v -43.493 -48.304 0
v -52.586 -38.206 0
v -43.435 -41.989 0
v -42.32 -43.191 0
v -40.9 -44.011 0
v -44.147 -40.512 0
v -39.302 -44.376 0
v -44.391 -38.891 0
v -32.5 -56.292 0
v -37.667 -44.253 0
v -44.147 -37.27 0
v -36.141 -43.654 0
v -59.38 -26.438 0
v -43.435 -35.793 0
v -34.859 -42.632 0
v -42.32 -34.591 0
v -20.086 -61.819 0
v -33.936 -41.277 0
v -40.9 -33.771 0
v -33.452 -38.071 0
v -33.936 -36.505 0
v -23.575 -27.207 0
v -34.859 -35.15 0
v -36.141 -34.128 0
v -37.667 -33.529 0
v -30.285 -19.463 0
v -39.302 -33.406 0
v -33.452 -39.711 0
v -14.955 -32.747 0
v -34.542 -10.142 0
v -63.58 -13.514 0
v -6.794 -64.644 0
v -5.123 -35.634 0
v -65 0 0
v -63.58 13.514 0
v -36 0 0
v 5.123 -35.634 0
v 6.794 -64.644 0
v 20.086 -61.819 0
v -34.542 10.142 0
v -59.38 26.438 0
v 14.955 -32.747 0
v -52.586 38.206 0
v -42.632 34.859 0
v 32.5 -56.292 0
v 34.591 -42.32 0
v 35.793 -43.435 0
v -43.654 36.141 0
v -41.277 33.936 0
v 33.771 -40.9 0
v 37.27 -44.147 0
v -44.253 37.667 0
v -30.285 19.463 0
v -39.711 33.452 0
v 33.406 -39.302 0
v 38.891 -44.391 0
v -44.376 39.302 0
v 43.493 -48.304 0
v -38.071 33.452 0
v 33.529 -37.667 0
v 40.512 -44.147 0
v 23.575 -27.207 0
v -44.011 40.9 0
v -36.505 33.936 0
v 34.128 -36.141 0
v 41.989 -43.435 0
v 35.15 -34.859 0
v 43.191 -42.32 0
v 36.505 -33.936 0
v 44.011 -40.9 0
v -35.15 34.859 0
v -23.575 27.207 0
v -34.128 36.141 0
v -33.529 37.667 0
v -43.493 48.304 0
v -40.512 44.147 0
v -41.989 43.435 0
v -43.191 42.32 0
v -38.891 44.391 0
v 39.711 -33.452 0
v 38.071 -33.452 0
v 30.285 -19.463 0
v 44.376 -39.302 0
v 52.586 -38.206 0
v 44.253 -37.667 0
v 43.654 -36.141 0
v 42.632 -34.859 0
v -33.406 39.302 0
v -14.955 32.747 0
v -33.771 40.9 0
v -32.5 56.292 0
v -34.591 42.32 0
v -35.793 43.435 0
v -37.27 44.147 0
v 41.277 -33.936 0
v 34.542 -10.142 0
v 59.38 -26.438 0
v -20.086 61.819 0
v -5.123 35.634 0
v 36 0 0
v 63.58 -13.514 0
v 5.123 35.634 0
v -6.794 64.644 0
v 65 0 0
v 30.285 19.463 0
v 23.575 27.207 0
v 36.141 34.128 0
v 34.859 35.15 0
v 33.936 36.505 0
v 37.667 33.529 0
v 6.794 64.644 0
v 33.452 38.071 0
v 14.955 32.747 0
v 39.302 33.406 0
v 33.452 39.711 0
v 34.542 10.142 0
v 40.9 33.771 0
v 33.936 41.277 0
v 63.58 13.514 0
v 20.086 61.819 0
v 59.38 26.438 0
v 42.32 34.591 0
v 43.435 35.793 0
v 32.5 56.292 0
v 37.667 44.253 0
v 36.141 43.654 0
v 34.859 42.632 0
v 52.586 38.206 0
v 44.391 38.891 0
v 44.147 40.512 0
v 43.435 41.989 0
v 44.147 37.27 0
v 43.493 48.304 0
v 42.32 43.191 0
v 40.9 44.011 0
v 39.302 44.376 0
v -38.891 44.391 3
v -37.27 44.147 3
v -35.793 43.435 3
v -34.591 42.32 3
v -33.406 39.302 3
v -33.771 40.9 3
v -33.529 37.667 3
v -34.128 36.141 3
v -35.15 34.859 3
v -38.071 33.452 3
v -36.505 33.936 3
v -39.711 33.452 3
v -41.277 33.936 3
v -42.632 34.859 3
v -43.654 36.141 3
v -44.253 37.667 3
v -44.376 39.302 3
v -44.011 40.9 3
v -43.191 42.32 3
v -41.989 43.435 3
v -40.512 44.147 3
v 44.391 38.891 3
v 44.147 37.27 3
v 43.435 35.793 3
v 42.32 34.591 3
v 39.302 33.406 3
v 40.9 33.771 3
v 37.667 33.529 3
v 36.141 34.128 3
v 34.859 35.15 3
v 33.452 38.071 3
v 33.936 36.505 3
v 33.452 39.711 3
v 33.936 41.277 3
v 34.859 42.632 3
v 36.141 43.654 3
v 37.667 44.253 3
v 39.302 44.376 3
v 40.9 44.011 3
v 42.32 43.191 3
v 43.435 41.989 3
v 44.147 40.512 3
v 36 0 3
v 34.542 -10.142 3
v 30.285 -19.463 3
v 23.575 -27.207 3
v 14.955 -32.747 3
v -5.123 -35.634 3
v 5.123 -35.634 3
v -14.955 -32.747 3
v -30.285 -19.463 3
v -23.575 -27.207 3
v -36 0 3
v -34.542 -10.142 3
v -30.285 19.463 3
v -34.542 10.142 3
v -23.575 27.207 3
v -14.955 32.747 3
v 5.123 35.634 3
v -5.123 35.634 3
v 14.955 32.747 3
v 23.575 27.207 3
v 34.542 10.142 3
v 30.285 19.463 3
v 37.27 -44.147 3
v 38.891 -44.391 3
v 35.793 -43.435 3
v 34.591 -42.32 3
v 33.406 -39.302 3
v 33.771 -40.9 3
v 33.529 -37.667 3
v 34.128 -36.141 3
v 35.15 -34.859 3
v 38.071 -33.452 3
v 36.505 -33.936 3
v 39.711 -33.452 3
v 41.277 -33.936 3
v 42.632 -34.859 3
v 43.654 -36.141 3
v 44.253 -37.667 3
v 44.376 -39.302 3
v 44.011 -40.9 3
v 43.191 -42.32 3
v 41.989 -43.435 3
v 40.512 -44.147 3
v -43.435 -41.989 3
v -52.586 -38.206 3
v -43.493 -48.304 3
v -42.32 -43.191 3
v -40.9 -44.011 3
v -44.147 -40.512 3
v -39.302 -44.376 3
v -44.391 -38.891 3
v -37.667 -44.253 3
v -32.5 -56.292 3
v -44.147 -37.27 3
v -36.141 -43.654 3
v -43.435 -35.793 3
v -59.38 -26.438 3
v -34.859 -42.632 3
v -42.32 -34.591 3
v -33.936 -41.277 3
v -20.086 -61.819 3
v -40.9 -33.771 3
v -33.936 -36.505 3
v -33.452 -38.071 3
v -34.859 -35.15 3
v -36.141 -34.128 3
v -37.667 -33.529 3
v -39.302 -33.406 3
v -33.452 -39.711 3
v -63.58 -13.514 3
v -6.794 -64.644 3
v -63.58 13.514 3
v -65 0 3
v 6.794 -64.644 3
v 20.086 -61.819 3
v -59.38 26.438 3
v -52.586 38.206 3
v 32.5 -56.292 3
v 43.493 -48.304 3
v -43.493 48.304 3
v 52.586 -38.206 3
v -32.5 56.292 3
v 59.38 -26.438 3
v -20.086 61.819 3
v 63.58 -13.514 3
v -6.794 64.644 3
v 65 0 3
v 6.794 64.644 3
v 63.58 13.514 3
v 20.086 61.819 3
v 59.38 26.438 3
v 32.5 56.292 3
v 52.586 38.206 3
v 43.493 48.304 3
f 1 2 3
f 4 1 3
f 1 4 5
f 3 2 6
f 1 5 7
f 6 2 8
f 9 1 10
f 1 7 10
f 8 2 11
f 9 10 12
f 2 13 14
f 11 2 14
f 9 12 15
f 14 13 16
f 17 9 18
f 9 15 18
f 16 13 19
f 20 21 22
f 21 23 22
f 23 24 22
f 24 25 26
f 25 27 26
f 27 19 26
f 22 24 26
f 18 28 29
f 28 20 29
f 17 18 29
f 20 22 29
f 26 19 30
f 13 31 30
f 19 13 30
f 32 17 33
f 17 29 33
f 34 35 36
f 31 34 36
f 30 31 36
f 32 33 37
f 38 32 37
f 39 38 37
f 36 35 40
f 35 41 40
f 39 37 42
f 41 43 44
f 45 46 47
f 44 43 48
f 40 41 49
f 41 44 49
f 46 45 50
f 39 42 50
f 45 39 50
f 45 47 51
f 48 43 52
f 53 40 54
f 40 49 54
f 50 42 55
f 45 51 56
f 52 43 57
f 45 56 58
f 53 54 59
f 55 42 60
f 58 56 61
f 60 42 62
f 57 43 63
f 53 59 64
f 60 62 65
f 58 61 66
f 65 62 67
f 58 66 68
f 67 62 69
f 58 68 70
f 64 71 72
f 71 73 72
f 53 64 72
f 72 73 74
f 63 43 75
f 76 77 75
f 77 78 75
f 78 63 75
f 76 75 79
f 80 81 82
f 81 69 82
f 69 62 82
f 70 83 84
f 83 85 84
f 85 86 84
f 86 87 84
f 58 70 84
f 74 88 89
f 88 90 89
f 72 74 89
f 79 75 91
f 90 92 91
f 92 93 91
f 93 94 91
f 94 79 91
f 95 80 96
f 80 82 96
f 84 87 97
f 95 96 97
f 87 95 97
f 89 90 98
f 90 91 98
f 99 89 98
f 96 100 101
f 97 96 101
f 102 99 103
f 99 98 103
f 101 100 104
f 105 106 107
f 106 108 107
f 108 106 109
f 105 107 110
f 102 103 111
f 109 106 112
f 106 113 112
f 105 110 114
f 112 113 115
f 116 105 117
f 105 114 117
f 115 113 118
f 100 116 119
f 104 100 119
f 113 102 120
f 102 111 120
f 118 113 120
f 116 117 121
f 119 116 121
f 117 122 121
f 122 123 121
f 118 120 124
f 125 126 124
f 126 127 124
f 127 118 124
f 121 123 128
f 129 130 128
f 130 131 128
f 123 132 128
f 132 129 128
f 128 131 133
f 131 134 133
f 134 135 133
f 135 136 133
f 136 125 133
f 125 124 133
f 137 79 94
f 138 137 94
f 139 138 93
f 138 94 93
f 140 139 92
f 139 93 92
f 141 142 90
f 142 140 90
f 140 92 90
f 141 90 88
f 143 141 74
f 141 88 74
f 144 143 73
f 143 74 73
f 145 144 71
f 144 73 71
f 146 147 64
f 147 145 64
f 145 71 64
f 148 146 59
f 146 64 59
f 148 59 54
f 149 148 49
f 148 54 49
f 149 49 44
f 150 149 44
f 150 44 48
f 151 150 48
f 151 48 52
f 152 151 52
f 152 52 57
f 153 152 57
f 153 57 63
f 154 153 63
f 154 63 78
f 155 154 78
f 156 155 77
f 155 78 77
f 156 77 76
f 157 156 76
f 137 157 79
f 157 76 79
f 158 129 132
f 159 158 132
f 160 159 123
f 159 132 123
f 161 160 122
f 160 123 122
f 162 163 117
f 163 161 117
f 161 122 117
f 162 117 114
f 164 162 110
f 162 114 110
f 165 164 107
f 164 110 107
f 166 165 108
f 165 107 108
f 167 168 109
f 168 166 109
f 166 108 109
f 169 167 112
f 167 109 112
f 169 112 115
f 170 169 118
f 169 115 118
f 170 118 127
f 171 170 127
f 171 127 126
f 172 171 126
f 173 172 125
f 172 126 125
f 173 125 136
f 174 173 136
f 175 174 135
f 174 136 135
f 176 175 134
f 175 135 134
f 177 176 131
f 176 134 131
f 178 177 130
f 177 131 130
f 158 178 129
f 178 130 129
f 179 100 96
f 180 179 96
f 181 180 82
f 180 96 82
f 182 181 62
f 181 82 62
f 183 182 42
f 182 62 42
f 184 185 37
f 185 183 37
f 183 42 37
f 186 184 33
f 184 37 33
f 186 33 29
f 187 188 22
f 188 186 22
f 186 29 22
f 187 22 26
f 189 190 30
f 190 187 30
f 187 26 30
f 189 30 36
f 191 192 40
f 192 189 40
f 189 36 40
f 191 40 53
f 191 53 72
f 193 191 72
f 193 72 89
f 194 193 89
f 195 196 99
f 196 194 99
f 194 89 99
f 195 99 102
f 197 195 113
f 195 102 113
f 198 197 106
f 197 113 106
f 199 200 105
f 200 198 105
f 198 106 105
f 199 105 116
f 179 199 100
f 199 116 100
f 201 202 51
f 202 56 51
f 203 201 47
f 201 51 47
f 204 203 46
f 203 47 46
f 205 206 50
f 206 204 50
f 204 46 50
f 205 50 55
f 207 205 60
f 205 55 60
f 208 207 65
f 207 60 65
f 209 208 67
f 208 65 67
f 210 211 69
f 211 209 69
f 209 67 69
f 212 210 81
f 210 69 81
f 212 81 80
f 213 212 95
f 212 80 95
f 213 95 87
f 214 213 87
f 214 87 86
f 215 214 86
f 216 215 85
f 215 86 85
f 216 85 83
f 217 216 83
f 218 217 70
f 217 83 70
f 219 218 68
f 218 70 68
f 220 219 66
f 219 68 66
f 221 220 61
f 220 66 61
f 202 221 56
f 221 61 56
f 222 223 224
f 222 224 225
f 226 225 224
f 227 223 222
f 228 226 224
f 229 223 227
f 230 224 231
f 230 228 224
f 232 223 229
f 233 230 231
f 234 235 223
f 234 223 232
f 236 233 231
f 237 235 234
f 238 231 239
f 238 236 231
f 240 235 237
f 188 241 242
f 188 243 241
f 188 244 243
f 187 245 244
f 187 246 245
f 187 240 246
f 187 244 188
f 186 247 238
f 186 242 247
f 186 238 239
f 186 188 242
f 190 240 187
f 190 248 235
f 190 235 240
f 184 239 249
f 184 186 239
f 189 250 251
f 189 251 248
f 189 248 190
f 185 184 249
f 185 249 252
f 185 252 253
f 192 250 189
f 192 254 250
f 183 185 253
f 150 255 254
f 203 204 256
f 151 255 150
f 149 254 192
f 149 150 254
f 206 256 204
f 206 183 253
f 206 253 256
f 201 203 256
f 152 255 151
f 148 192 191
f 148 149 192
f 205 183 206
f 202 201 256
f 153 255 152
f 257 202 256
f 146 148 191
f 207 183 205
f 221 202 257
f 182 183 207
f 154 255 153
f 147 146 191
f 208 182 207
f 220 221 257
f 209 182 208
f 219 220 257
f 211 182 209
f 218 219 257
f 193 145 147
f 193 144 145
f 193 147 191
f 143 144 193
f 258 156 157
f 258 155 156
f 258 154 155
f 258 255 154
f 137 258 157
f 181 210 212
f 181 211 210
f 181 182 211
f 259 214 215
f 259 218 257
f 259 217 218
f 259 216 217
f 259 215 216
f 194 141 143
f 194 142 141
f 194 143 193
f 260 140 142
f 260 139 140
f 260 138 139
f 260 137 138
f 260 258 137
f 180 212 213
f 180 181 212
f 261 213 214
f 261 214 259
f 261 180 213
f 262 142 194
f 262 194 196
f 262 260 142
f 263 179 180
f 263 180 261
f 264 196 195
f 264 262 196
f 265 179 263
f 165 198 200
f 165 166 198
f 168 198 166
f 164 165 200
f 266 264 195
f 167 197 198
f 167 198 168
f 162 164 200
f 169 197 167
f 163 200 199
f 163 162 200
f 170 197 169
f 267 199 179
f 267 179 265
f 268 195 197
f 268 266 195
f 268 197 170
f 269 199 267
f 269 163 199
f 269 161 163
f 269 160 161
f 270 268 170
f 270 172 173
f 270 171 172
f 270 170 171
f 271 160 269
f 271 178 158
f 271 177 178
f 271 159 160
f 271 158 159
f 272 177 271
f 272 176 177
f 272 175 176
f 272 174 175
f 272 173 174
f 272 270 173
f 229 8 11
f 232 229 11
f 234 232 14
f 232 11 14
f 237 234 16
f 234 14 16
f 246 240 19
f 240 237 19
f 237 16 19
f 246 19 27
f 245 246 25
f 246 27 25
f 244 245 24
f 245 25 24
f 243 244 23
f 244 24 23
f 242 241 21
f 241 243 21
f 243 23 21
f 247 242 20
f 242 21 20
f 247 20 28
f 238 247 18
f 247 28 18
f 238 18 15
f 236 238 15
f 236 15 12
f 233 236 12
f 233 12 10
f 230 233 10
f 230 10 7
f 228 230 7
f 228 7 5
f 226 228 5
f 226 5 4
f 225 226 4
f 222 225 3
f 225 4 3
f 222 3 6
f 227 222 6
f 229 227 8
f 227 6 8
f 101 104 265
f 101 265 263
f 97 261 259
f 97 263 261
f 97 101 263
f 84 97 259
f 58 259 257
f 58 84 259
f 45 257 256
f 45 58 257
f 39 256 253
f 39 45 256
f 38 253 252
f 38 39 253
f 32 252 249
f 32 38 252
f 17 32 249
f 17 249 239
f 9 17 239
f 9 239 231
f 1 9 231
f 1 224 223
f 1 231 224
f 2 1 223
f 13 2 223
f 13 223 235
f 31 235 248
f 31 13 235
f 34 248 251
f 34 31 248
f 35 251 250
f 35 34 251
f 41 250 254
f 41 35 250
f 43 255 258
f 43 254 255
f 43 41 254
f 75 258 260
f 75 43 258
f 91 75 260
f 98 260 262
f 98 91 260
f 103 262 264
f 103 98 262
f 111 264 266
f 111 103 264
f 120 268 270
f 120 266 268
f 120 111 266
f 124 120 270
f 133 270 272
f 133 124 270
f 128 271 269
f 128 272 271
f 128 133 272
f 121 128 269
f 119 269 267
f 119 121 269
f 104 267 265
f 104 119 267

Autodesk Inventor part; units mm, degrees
ref_plane "YZ Plane" through (0, 0, 0) normal (1, 0, 0) x (0, 1, 0)
ref_plane "XZ Plane" through (0, 0, 0) normal (0, 1, 0) x (-1, 0, 0)
ref_plane "XY Plane" through (0, 0, 0) normal (0, 0, 1) x (1, 0, 0)
sketch "Sketch1" plane through (0, 0, 0) normal (0, 0, 1) x (1, 0, 0)
  circle A0 centre (0, 0) radius 36
  circle A1 centre (0, 0) radius 65
  line L0 (45.9619, -45.9619) -> (-45.9619, 45.9619) construction
  line L1 (-45.9619, -45.9619) -> (45.9619, 45.9619) construction
  point P0 (0, 36)
  dimension "d44" = 72
  dimension "d23" = 130
extrude "Plate1" add sketch "Sketch1" along normal blind 3
sketch "Sketch6" plane through (0, 0, 0) normal (0, 0, 1) x (1, 0, 0)
  line L0 (0, 0) -> (0, 55) construction
  circle A0 centre (0, 0) radius 55 construction
  line L1 (0, 0) -> (38.8909, 38.8909) construction
  circle A1 centre (38.8909, 38.8909) radius 5.5
  dimension "d42" = 72.5
  dimension "d32" = 11
  dimension "d33" = 110
  dimension "d34" = 45
extrude "Cut2" cut sketch "Sketch6" along normal blind 3
pattern_circular "Circular Pattern2" count 4 over 360 about axis through (0, 0, -10) along (0, 0, -1) of "Cut2"
equation "\"d35\" = Thickness"
equation "\"d2\" = Thickness"
equation "\"BendRadius\" = Thickness"
equation "\"BendReliefWidth\" = Thickness"
equation "\"BendReliefDepth\" = 0.5 * Thickness"
equation "\"CornerReliefSize\" = 4 * Thickness"
equation "\"MinimumRemnant\" = 2 * Thickness"
equation "\"TransitionRadius\" = BendRadius"
equation "\"JacobiRadiusSize\" = BendRadius"
equation "\"GapSize\" = Thickness"
equation "\"Octaeder_side\" = d41"
equation "\"Octaeder_flange_lenth\" = d42"
equation "\"Thickness\" = 3"
equation "\"d41\" = 55.918831"
properties part number "DSB 131 head flange"
